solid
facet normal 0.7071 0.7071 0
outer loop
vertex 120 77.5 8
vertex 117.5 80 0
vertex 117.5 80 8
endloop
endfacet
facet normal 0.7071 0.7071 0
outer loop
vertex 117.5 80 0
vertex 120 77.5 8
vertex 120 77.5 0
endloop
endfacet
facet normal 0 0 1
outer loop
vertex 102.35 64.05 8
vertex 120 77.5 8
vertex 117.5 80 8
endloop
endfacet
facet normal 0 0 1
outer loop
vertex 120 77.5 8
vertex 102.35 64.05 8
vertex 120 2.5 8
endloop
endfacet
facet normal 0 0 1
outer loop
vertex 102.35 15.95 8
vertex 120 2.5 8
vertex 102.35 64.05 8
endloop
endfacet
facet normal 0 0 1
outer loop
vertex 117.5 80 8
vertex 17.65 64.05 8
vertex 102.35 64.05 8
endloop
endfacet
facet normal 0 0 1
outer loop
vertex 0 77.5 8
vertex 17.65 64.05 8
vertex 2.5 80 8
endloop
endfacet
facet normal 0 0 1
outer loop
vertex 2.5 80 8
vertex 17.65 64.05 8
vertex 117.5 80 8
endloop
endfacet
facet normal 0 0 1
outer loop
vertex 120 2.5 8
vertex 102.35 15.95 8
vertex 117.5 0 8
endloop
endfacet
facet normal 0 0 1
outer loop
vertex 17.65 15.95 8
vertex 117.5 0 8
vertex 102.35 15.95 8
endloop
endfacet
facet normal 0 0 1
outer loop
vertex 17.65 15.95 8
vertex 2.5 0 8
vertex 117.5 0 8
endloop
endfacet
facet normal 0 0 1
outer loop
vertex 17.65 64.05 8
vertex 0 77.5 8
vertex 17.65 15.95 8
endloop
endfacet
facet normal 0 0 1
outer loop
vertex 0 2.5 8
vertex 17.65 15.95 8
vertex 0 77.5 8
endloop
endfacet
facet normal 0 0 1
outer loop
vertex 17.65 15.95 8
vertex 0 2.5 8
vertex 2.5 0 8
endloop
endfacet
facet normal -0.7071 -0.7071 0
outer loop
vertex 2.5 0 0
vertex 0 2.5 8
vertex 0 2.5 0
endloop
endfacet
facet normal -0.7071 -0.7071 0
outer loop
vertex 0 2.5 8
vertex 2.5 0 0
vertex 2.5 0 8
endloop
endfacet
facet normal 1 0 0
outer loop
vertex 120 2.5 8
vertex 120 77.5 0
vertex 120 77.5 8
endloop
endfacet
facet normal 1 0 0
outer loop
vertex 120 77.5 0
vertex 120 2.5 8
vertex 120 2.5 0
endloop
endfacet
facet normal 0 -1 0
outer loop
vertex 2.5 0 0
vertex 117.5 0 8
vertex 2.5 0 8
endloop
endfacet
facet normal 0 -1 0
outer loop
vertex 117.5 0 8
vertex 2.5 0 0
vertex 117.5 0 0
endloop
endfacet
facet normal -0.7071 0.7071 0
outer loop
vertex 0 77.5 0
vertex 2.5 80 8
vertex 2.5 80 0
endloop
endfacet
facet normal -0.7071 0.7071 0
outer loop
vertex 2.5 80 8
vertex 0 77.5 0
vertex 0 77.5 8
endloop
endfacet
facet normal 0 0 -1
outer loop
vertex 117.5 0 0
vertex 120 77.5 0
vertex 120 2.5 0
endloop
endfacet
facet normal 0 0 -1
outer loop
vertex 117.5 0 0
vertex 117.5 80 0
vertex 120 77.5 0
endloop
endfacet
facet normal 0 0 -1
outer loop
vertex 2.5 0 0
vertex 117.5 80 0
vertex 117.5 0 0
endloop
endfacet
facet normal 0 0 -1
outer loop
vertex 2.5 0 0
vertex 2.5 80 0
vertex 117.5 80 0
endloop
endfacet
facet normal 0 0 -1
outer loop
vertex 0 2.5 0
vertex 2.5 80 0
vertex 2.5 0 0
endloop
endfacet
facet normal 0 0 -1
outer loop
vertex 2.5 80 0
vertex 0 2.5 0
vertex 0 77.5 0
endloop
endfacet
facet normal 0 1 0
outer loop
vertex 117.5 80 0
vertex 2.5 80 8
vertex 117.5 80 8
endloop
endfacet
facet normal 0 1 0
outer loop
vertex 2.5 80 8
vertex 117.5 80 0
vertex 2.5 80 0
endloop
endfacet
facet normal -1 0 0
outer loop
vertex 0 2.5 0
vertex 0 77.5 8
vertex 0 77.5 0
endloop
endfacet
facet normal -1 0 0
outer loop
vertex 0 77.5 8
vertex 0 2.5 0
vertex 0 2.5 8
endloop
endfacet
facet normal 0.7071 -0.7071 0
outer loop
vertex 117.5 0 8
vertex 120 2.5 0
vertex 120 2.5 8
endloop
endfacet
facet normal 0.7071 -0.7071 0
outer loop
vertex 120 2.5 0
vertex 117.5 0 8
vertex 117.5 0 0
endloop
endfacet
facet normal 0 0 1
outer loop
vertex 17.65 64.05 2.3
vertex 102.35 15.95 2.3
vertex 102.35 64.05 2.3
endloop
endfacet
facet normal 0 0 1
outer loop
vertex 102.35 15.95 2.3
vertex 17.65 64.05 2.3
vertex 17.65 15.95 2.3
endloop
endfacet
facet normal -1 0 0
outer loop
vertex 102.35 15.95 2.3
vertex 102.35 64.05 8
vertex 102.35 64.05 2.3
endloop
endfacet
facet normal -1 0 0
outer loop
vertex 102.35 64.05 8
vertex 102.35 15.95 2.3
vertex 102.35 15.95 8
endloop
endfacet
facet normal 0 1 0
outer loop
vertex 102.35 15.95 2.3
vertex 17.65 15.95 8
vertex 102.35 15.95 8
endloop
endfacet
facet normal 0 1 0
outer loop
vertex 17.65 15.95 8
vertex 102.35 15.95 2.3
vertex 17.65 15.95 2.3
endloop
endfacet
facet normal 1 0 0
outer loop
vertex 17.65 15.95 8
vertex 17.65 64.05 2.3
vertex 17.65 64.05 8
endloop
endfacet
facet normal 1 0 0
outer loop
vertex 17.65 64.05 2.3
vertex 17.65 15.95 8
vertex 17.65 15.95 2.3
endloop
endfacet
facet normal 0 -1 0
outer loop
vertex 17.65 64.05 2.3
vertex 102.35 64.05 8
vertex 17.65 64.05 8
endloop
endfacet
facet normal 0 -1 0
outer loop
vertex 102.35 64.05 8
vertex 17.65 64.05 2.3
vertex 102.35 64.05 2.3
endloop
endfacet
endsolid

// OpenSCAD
$fn = 32;

// ----------------------------------------------------------------------
// Windowed plate: 1 voids, 120 x 80 x 8 mm
// ----------------------------------------------------------------------

// --- parameters (mm) ---
plate_l = 120;            // plate length, X
plate_w = 80;             // plate width, Y
plate_t = 8;              // plate thickness, Z
edge_margin = 10;         // wall from the plate edge to any window
win1_l = 84.7;            // window length
win1_w = 48.1;            // window width
depth_1 = 5.7;            // depth of void 1 (full thickness = through)
corner_c = 2.5;           // corner chamfer of the plate

profile = [[2.5, 0], [117.5, 0], [120, 2.5], [120, 77.5], [117.5, 80], [2.5, 80], [0, 77.5], [0, 2.5]];  // primary outline, 8 points, counter clockwise
void_1 = [[17.65, 15.95], [102.35, 15.95], [102.35, 64.05], [17.65, 64.05]];  // large central window, 4 points

// --- the one profile operation ---
difference() {
  linear_extrude(height = plate_t) polygon(points = profile);
  translate([0, 0, plate_t - depth_1])
    linear_extrude(height = depth_1 + 1) polygon(points = void_1);
}
